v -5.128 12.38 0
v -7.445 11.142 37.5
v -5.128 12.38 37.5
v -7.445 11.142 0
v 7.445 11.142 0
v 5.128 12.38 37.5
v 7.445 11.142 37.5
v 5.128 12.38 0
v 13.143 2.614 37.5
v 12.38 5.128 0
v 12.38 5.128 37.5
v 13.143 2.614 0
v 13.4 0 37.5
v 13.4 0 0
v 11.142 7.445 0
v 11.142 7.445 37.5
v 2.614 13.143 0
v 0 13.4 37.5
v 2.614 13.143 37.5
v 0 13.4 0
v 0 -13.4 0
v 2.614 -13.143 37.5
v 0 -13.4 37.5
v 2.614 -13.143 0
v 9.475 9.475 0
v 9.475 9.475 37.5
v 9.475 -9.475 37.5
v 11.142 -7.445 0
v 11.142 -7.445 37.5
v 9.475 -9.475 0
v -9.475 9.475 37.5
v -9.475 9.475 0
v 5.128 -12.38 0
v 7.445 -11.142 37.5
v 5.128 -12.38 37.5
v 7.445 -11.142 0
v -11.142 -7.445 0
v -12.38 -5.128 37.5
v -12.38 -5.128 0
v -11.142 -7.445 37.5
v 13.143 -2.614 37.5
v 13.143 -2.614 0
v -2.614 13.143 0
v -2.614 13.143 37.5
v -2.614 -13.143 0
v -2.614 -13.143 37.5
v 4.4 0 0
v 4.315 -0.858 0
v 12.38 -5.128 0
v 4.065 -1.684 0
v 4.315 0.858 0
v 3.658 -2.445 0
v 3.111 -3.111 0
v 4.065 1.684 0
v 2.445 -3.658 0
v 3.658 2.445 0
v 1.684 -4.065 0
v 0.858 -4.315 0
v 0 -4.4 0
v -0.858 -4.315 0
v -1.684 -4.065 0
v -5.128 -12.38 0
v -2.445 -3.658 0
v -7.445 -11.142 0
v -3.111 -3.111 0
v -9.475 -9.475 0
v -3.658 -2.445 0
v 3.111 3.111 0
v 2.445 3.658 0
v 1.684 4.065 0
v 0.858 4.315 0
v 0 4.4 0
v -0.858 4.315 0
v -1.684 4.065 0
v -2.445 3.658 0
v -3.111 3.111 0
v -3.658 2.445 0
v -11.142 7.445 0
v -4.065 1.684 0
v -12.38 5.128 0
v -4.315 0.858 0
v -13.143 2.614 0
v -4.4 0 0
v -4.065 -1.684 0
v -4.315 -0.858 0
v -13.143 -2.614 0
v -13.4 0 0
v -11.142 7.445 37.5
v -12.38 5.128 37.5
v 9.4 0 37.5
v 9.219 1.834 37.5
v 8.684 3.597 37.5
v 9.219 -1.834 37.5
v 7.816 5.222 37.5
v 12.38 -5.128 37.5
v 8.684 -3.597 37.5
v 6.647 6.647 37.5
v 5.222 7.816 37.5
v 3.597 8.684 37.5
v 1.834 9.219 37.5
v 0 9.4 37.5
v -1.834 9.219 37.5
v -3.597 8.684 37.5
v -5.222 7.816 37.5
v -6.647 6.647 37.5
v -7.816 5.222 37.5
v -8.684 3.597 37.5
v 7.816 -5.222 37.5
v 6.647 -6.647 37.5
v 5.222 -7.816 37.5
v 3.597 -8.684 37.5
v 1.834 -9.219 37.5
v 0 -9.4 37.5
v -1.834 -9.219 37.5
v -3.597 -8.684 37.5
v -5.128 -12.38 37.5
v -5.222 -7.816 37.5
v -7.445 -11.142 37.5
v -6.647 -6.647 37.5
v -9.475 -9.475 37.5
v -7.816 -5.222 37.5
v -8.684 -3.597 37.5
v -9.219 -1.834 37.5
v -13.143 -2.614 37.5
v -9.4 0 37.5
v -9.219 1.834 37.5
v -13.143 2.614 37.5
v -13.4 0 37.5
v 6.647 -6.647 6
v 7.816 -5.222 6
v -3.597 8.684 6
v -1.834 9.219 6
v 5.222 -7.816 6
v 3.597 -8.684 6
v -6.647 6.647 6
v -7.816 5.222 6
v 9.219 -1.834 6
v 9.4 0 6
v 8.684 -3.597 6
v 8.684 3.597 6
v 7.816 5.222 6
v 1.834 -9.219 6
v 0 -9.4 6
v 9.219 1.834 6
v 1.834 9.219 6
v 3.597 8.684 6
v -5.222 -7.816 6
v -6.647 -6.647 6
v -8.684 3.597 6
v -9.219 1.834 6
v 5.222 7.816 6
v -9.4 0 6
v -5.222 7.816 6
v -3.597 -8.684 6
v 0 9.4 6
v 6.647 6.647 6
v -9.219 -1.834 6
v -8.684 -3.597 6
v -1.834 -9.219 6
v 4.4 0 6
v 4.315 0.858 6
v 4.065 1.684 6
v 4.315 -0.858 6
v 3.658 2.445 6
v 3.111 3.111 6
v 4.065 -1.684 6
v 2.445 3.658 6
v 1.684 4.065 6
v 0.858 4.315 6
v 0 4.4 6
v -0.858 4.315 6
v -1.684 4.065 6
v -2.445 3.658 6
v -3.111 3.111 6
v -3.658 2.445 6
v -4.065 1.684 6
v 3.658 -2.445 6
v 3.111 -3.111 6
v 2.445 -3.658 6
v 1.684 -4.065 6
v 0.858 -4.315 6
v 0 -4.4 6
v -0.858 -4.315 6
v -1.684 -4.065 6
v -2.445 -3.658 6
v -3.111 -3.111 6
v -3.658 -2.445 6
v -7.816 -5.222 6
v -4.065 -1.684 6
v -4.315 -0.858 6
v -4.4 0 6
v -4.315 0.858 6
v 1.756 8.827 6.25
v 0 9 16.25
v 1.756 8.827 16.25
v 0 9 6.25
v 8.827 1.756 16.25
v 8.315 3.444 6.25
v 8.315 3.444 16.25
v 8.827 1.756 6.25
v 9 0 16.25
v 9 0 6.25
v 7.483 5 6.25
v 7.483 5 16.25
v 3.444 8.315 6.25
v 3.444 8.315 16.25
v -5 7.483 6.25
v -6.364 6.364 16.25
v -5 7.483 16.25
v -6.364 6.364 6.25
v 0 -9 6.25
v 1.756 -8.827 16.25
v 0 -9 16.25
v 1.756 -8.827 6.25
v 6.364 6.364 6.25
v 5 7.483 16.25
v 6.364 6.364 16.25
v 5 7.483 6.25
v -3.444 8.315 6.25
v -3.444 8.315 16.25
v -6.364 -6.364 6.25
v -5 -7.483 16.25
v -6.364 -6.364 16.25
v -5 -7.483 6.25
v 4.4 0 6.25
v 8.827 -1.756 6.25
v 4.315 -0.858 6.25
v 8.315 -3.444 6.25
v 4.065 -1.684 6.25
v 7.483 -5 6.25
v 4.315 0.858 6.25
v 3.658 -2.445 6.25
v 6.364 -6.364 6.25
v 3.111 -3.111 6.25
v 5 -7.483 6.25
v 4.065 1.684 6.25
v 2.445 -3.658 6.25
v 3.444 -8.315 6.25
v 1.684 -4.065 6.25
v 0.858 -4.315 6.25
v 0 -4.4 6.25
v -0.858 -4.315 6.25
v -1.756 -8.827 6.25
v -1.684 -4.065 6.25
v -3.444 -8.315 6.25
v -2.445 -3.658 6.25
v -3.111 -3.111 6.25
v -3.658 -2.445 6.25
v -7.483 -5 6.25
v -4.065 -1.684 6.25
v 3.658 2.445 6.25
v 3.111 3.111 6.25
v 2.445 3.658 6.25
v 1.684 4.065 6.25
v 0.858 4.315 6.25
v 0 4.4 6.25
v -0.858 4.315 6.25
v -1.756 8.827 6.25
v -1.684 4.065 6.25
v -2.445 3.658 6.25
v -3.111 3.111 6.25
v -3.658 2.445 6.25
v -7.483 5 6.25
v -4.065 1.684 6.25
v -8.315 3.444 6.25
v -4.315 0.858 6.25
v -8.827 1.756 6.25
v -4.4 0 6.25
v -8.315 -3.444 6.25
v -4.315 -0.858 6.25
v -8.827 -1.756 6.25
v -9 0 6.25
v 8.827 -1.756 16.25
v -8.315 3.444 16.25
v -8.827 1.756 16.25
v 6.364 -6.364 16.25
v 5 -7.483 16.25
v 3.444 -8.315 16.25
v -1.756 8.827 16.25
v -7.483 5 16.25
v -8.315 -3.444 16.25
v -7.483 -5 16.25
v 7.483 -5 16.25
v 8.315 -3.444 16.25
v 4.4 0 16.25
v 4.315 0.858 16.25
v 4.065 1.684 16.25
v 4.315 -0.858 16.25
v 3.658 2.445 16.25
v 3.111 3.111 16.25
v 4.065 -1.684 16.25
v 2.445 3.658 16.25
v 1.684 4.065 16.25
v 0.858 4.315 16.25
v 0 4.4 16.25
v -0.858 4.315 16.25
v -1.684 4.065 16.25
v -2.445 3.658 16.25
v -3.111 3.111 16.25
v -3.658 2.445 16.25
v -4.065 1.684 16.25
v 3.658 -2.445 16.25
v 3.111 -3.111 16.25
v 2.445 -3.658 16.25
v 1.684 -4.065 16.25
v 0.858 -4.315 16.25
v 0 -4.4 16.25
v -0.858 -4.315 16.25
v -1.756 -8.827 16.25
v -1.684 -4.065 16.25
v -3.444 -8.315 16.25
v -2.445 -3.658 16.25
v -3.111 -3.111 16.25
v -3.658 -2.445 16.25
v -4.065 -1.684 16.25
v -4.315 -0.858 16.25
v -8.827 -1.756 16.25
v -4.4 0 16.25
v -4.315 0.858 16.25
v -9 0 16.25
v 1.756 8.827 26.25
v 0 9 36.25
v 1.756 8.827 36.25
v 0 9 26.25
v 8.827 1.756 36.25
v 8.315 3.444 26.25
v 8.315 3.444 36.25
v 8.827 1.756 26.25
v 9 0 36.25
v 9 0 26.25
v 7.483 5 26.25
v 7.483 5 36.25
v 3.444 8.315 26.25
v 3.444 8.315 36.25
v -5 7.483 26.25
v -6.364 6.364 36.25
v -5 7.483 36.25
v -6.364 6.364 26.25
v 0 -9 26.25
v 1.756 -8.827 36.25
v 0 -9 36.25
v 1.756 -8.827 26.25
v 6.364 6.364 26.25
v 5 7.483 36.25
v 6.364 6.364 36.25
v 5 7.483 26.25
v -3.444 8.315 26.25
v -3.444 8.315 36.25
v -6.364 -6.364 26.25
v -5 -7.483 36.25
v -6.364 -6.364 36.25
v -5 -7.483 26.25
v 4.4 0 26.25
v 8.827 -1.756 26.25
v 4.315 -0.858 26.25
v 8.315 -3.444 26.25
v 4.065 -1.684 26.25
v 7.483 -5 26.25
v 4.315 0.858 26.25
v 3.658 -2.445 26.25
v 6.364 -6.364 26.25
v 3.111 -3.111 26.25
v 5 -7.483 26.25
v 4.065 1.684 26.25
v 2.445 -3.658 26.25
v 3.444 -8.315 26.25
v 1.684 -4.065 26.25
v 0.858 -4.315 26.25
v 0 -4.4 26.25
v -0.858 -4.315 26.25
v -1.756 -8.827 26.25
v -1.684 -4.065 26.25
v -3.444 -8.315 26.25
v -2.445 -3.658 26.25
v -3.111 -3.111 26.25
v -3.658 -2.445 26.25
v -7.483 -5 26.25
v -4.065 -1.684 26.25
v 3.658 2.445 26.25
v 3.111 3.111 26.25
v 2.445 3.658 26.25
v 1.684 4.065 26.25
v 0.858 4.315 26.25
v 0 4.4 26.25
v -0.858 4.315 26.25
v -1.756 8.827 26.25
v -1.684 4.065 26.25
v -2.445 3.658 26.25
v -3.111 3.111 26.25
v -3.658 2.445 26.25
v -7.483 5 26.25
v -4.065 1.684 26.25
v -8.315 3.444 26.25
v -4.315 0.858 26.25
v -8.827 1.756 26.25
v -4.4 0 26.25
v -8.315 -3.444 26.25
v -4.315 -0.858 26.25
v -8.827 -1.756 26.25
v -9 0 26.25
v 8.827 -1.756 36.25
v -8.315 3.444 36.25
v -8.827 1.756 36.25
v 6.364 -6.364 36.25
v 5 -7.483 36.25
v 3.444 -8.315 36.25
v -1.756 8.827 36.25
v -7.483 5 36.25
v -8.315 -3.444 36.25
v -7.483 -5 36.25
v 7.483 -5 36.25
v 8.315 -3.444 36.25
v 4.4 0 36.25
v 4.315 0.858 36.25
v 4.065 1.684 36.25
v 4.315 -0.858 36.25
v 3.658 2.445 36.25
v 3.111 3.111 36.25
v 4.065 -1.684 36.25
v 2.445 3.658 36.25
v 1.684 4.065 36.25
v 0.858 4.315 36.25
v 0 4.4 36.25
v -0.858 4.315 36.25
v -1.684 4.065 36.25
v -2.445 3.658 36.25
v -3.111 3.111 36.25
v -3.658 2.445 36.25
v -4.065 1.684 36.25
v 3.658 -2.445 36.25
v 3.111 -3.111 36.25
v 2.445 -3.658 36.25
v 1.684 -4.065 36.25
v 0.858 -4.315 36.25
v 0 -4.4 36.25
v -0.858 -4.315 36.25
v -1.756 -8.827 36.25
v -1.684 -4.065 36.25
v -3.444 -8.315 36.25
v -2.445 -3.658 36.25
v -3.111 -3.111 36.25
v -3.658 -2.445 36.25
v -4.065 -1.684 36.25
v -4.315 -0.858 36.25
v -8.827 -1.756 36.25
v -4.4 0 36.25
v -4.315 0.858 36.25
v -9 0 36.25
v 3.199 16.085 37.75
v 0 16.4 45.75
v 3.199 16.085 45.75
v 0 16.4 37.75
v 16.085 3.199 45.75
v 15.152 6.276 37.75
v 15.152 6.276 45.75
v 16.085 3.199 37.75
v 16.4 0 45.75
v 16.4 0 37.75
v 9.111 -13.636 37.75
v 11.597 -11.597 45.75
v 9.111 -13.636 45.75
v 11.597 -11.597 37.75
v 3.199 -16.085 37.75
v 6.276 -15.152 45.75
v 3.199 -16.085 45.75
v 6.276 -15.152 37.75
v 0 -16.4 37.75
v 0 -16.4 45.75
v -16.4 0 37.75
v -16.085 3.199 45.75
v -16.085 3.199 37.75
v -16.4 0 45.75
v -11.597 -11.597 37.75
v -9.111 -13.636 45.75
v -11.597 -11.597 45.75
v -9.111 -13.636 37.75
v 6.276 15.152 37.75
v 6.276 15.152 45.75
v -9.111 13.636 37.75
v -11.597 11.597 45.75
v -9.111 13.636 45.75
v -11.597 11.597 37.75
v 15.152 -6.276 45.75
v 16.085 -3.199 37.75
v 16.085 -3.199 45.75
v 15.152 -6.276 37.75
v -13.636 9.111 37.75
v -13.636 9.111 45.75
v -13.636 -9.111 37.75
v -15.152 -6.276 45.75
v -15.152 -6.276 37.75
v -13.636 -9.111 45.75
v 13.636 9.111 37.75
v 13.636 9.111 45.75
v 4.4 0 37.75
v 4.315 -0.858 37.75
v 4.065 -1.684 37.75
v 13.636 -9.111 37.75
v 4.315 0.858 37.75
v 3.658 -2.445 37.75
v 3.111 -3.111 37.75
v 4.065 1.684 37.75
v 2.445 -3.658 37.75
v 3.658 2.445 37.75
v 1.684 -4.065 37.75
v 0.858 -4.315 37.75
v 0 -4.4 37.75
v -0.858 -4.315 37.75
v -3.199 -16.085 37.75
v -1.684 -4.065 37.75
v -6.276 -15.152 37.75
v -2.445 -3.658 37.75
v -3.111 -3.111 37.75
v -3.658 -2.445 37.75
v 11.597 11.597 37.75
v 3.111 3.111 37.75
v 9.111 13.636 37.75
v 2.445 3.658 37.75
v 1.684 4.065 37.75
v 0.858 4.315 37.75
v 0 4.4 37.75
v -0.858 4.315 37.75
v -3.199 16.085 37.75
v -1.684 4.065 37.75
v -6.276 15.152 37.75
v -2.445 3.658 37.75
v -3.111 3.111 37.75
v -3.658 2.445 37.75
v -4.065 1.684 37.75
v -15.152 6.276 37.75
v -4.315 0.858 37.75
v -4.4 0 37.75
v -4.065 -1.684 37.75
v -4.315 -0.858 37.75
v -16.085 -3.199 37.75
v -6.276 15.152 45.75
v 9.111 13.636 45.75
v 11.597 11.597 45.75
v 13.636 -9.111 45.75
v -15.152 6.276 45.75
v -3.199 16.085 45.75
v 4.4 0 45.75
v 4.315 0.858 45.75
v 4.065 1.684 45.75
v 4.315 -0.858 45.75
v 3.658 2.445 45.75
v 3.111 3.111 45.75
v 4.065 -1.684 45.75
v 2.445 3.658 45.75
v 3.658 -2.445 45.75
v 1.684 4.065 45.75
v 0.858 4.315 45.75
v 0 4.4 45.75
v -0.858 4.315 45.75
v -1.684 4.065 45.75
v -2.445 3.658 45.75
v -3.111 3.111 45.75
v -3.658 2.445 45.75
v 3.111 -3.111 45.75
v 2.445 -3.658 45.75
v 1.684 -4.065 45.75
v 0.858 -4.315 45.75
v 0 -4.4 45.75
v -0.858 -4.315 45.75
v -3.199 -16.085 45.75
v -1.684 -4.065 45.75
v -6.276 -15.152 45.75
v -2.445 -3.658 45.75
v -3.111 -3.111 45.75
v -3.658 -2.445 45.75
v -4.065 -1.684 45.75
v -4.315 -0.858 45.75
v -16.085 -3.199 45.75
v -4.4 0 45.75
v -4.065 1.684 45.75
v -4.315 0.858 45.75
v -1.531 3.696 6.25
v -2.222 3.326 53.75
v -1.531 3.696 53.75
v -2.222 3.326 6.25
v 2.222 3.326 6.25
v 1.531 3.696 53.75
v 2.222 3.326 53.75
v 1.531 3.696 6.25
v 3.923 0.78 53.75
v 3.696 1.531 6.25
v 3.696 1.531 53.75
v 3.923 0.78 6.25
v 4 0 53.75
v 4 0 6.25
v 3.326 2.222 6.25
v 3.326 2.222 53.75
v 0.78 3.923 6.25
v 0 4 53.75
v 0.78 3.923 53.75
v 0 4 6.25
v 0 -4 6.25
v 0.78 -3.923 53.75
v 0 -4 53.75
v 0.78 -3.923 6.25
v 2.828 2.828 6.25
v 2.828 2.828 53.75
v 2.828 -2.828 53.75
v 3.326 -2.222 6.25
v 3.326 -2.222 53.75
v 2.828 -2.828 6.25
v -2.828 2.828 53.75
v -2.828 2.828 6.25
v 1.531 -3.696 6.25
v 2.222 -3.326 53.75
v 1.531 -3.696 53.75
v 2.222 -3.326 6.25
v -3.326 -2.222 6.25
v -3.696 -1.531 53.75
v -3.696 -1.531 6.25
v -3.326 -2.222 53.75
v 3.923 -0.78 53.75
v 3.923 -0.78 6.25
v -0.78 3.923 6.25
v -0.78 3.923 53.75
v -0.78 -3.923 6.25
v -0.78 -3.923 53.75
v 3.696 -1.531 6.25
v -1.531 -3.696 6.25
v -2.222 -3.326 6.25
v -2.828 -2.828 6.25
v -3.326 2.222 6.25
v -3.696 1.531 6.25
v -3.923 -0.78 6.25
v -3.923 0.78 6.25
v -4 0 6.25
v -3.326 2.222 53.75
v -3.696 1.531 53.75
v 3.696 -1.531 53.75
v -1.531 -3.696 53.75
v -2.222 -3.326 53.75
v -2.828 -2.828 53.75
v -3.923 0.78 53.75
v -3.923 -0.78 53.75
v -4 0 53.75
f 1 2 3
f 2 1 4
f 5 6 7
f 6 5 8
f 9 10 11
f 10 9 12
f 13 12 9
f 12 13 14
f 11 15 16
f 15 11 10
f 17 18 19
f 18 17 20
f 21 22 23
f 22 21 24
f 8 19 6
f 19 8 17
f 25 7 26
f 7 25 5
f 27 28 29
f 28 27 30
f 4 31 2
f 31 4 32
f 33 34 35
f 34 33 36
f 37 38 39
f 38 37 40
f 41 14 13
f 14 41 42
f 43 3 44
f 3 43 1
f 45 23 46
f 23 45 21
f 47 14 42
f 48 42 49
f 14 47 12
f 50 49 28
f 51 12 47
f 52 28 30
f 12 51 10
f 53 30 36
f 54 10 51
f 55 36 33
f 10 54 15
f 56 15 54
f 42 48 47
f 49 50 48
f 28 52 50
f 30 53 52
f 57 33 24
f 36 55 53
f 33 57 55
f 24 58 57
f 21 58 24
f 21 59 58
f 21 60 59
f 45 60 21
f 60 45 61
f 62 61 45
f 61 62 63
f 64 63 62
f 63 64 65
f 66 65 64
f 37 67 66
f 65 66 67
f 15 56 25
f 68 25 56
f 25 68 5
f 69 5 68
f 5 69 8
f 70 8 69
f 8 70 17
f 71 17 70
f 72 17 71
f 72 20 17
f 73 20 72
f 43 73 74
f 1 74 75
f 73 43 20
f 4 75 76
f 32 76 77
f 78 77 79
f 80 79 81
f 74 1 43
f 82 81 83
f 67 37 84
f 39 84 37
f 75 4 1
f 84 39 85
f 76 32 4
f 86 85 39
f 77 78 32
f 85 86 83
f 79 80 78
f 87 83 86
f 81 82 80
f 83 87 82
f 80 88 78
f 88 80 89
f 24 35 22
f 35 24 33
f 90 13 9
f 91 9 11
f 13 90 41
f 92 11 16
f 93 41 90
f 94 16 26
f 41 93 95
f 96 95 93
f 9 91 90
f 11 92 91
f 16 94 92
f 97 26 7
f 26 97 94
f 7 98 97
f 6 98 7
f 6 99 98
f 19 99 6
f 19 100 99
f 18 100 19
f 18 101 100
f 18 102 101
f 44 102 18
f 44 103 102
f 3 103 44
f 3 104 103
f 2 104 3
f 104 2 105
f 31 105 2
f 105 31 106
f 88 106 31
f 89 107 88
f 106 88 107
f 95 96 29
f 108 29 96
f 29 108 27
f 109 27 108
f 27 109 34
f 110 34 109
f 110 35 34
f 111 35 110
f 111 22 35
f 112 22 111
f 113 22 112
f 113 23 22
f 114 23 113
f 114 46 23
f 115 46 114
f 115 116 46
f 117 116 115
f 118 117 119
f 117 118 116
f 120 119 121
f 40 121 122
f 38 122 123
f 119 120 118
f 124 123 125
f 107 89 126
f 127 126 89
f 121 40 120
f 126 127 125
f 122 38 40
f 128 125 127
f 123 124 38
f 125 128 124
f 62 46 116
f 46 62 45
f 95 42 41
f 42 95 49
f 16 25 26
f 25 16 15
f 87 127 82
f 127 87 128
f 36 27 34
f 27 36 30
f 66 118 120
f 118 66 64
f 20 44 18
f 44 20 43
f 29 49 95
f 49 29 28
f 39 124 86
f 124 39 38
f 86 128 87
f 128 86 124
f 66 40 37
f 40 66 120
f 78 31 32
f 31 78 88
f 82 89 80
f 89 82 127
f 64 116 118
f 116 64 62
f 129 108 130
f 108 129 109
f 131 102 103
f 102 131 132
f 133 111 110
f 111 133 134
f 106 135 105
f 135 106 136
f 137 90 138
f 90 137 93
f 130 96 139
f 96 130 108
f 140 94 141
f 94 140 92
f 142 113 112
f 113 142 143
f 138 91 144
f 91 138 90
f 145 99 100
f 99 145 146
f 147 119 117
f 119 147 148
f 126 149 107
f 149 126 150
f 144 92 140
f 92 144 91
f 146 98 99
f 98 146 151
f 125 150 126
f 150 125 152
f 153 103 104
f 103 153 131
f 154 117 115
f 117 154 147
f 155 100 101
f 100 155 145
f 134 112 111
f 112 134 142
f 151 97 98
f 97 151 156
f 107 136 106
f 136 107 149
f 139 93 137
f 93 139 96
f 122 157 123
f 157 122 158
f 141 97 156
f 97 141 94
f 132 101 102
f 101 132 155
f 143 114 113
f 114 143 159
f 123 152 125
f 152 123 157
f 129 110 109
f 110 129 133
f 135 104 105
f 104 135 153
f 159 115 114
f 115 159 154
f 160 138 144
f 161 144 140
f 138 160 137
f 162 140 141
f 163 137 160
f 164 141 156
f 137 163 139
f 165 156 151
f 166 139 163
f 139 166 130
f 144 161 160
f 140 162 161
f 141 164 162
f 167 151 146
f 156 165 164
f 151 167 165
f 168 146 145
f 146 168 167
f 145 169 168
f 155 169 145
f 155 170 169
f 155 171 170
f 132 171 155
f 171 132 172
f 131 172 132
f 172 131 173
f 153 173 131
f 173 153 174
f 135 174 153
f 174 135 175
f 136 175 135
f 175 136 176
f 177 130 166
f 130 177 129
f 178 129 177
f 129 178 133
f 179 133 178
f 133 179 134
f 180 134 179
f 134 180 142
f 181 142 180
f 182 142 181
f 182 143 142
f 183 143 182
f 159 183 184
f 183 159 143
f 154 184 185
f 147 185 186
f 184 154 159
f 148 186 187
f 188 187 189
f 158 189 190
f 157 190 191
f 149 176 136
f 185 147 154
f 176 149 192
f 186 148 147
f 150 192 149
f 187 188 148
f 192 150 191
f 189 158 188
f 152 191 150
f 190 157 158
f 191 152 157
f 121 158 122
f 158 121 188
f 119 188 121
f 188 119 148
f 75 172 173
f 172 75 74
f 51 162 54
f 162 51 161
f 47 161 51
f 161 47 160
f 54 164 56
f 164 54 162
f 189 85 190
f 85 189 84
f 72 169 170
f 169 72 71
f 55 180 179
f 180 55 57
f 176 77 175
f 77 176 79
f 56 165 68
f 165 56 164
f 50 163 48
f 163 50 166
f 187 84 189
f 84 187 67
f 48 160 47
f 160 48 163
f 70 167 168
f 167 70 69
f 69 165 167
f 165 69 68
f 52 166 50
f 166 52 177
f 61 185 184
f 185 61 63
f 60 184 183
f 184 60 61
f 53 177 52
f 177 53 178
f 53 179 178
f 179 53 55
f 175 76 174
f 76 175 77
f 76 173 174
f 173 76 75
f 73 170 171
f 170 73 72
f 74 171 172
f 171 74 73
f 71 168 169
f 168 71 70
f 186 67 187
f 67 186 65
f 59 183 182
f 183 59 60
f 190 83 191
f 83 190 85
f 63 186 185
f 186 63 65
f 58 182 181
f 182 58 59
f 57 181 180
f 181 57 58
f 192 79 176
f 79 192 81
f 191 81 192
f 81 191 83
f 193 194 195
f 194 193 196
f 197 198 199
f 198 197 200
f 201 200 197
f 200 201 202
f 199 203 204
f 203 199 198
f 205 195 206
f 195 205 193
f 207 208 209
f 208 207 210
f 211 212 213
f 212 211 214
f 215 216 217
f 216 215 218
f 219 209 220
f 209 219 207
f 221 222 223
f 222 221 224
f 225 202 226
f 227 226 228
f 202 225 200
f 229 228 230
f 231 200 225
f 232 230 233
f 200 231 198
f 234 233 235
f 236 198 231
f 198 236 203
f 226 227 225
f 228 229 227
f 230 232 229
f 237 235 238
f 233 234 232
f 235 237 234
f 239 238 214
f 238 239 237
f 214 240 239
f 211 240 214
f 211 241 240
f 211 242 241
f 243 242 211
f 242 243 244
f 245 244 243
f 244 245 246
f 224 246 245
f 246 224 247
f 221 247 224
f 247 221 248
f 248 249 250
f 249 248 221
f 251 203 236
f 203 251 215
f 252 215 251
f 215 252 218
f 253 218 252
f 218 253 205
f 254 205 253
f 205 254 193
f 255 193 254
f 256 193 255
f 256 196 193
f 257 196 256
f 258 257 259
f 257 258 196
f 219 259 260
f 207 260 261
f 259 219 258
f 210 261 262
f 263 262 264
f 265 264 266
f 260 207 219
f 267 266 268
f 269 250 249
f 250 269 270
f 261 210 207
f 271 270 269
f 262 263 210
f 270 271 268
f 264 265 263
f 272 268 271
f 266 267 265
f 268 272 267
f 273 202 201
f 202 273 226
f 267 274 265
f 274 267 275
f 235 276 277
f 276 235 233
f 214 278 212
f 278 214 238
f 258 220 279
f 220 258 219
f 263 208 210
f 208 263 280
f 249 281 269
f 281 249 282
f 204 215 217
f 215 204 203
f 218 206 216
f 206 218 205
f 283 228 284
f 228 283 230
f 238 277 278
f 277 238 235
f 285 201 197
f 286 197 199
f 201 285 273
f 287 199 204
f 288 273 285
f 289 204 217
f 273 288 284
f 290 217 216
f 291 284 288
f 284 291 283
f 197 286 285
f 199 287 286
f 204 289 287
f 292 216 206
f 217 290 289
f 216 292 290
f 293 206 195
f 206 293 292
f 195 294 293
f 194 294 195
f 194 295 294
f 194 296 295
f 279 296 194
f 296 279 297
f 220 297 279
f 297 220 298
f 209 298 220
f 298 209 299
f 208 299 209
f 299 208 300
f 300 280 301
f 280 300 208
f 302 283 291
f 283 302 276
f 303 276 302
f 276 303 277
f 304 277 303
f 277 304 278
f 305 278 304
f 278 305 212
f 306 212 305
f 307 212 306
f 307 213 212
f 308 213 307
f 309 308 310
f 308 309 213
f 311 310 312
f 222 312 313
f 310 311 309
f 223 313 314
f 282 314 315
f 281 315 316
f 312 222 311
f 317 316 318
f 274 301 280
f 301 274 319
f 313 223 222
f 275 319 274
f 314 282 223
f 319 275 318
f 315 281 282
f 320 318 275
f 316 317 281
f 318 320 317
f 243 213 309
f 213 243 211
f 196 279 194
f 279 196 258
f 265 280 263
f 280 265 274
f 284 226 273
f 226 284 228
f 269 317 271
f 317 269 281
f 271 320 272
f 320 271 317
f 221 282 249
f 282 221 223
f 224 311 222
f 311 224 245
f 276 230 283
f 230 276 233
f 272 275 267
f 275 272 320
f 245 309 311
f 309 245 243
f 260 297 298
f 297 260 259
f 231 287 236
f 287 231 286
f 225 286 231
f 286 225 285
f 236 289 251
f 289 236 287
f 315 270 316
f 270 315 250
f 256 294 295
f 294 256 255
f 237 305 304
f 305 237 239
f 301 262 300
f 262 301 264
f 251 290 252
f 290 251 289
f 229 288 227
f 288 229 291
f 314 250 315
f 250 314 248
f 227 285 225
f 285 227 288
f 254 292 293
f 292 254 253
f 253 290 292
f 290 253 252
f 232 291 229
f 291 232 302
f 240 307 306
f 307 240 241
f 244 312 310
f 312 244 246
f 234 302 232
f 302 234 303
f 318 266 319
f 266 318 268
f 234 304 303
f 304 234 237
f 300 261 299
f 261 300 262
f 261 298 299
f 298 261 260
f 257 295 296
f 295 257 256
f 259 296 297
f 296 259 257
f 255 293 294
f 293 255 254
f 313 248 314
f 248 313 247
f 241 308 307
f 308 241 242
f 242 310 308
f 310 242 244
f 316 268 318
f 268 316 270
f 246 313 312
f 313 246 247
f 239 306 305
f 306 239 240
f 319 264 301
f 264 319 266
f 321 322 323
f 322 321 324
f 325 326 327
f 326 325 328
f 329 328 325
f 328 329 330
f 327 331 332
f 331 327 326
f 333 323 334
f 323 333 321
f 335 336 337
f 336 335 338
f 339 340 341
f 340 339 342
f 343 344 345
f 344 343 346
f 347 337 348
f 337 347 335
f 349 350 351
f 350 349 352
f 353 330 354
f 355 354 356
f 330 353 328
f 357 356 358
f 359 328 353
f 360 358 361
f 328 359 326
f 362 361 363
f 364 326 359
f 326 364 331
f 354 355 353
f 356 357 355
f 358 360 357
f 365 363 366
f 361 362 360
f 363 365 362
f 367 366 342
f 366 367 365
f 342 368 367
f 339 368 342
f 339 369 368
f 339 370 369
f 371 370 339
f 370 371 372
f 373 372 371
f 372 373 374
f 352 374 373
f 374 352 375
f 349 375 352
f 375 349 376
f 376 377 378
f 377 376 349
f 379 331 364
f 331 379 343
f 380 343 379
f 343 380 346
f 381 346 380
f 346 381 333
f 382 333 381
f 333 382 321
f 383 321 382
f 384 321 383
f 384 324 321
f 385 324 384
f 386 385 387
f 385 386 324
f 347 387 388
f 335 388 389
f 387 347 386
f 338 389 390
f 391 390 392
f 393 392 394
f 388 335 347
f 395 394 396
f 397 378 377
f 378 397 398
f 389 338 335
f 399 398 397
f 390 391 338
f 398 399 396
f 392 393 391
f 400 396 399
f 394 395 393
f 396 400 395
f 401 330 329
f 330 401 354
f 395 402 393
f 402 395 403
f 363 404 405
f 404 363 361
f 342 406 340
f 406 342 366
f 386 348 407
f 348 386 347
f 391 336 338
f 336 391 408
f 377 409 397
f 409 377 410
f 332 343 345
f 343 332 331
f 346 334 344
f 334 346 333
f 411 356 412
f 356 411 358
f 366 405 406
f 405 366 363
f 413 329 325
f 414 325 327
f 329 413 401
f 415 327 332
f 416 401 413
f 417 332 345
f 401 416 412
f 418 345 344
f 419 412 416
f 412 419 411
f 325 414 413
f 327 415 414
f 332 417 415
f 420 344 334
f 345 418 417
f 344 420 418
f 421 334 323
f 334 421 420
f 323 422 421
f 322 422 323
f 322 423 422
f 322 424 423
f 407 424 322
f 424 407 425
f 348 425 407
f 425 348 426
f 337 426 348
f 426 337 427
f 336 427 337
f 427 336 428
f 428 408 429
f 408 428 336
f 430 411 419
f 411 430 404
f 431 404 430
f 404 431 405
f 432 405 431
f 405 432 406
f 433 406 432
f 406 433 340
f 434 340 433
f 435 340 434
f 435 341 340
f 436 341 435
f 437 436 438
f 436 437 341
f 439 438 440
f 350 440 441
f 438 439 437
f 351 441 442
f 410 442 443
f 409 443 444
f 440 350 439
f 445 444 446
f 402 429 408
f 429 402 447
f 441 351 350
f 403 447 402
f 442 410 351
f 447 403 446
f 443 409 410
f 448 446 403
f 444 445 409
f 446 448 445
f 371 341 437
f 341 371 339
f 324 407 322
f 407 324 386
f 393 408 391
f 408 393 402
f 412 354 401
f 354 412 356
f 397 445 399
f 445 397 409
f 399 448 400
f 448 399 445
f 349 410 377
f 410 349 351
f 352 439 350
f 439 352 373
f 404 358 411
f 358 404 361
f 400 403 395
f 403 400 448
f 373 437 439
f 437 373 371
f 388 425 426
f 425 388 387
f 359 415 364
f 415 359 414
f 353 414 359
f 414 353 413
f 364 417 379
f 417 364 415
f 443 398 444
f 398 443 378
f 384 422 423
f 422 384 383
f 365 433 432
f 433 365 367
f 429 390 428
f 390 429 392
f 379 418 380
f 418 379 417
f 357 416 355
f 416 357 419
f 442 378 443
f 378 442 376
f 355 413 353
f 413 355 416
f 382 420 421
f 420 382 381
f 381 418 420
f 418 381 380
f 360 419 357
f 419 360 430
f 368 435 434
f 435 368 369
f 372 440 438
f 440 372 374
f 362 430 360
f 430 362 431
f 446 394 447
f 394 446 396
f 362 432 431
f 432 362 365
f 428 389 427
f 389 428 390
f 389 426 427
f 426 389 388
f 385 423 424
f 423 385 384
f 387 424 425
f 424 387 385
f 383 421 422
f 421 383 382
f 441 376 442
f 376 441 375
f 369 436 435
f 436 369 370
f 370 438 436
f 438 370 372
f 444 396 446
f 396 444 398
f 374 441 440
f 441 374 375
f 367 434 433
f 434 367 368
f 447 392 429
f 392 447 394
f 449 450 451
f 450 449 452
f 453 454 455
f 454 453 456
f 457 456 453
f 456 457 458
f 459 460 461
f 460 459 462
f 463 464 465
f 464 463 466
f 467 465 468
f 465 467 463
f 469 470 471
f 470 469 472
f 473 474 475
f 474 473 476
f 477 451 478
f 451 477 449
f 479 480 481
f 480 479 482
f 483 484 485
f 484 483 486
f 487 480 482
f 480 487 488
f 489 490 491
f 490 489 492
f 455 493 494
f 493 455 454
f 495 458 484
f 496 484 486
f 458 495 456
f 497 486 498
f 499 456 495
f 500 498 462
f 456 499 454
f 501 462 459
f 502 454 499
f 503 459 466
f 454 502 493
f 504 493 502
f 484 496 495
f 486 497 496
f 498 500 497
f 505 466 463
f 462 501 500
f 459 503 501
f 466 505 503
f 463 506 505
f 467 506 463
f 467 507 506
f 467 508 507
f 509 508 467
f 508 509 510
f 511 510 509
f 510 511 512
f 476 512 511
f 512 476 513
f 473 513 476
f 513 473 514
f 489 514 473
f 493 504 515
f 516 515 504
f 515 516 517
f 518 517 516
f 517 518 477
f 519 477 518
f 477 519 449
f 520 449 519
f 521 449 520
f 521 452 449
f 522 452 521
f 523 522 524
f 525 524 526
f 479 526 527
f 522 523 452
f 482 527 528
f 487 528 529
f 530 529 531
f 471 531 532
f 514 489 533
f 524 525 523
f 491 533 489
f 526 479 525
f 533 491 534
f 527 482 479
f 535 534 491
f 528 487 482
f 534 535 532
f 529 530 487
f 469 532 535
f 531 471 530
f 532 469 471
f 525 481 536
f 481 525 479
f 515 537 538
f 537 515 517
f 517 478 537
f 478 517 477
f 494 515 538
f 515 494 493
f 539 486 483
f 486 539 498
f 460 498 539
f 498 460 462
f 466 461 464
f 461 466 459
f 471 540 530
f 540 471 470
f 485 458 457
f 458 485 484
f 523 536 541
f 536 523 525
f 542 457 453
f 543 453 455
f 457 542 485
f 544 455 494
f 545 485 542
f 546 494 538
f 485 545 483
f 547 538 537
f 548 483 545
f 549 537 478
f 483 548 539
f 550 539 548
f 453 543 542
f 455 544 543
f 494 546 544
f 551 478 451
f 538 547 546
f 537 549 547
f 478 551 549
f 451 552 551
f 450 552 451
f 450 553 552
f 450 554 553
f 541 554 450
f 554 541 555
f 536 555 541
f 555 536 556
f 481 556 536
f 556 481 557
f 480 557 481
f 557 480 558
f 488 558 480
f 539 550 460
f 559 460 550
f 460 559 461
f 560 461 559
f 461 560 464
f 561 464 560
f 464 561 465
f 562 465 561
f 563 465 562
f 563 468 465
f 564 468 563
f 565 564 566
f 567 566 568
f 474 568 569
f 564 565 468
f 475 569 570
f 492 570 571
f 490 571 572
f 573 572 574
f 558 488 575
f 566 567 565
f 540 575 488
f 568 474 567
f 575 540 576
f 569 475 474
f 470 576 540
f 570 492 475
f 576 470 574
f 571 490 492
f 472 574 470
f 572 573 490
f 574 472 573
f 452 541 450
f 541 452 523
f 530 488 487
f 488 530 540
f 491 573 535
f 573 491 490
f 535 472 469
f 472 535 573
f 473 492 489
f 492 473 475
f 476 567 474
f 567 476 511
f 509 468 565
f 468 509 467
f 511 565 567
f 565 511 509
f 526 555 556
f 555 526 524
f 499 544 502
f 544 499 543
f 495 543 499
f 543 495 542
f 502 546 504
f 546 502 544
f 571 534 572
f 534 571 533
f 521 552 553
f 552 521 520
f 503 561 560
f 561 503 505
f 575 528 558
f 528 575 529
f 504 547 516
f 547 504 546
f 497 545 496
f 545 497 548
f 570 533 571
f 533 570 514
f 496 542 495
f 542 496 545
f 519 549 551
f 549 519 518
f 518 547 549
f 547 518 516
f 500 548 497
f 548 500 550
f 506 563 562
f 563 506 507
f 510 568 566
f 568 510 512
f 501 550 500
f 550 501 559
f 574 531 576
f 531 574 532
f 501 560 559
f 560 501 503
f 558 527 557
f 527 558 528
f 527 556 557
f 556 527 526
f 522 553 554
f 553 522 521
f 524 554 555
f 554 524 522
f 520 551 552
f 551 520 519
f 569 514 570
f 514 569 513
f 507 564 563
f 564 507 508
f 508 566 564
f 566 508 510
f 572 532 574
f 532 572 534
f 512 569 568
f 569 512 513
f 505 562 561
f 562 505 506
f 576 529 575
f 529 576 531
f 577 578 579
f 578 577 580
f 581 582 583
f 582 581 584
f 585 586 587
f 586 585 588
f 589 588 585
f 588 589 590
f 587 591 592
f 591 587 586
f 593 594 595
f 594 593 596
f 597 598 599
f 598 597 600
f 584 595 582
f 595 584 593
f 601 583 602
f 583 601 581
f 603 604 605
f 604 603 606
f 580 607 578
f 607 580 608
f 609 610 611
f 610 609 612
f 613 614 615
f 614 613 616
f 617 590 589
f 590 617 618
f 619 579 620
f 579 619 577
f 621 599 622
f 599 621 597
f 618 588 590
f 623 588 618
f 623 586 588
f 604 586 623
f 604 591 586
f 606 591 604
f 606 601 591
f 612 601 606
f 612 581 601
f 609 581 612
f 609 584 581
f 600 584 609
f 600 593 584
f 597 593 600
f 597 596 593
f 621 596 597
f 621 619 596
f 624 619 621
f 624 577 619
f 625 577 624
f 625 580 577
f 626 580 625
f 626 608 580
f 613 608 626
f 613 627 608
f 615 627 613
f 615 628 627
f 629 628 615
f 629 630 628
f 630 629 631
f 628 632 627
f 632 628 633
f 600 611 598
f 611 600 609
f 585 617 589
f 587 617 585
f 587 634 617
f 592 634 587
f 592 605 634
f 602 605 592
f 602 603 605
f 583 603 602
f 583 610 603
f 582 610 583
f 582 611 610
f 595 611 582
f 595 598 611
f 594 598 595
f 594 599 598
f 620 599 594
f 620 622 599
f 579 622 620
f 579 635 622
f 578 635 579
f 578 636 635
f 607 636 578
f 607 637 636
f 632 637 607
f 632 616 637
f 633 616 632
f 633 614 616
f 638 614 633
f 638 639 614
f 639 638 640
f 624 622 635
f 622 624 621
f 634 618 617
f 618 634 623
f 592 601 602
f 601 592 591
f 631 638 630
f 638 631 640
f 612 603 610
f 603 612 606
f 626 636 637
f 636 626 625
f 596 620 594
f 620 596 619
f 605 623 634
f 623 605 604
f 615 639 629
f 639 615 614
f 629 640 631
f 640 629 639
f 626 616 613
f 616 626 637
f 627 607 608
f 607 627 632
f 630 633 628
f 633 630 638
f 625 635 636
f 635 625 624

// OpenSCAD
$fn = 32;

// ------------------------------------------------------------------------
// Shaft station: cup d26.8 x 37.5 mm, shaft d8
// Every part is its own module, assembly() places every instance.
// ------------------------------------------------------------------------

// --- part 1 ---
module housing_cup() {
  difference() {
    cylinder(h = 37.5, d = 26.8);
    translate([0, 0, 6]) cylinder(h = 32.5, d = 18.8);
    translate([0, 0, -1]) cylinder(h = 8, d = 8.8);
  }
}

// --- part 2 ---
module bearing_lower() {
  difference() {
      translate([0, 0, 0]) cylinder(h = 10, d = 18);
      translate([0, 0, -1]) cylinder(h = 12, d = 8.8);
    }
}

// --- part 3 ---
module bearing_upper() {
  difference() {
      translate([0, 0, 0]) cylinder(h = 10, d = 18);
      translate([0, 0, -1]) cylinder(h = 12, d = 8.8);
    }
}

// --- part 4 ---
module station_shaft() {
  translate([0, 0, -23.75]) cylinder(h = 47.5, d = 8);
}

// --- part 5 ---
module station_cover() {
  difference() {
    cylinder(h = 8, d = 32.8);
    translate([0, 0, -1]) cylinder(h = 10, d = 8.8);
  }
}

// --- assembly ---
module assembly() {
  color([0.80, 0.24, 0.20]) translate([0, 0, 0]) rotate([0, 0, 0]) housing_cup();
  color([0.20, 0.45, 0.75]) translate([0, 0, 6.25]) rotate([0, 0, 0]) bearing_lower();
  color([0.25, 0.62, 0.32]) translate([0, 0, 26.25]) rotate([0, 0, 0]) bearing_upper();
  color([0.92, 0.70, 0.18]) translate([0, 0, 30]) rotate([0, 0, 0]) station_shaft();
  color([0.58, 0.35, 0.70]) translate([0, 0, 37.75]) rotate([0, 0, 0]) station_cover();
}

assembly();
